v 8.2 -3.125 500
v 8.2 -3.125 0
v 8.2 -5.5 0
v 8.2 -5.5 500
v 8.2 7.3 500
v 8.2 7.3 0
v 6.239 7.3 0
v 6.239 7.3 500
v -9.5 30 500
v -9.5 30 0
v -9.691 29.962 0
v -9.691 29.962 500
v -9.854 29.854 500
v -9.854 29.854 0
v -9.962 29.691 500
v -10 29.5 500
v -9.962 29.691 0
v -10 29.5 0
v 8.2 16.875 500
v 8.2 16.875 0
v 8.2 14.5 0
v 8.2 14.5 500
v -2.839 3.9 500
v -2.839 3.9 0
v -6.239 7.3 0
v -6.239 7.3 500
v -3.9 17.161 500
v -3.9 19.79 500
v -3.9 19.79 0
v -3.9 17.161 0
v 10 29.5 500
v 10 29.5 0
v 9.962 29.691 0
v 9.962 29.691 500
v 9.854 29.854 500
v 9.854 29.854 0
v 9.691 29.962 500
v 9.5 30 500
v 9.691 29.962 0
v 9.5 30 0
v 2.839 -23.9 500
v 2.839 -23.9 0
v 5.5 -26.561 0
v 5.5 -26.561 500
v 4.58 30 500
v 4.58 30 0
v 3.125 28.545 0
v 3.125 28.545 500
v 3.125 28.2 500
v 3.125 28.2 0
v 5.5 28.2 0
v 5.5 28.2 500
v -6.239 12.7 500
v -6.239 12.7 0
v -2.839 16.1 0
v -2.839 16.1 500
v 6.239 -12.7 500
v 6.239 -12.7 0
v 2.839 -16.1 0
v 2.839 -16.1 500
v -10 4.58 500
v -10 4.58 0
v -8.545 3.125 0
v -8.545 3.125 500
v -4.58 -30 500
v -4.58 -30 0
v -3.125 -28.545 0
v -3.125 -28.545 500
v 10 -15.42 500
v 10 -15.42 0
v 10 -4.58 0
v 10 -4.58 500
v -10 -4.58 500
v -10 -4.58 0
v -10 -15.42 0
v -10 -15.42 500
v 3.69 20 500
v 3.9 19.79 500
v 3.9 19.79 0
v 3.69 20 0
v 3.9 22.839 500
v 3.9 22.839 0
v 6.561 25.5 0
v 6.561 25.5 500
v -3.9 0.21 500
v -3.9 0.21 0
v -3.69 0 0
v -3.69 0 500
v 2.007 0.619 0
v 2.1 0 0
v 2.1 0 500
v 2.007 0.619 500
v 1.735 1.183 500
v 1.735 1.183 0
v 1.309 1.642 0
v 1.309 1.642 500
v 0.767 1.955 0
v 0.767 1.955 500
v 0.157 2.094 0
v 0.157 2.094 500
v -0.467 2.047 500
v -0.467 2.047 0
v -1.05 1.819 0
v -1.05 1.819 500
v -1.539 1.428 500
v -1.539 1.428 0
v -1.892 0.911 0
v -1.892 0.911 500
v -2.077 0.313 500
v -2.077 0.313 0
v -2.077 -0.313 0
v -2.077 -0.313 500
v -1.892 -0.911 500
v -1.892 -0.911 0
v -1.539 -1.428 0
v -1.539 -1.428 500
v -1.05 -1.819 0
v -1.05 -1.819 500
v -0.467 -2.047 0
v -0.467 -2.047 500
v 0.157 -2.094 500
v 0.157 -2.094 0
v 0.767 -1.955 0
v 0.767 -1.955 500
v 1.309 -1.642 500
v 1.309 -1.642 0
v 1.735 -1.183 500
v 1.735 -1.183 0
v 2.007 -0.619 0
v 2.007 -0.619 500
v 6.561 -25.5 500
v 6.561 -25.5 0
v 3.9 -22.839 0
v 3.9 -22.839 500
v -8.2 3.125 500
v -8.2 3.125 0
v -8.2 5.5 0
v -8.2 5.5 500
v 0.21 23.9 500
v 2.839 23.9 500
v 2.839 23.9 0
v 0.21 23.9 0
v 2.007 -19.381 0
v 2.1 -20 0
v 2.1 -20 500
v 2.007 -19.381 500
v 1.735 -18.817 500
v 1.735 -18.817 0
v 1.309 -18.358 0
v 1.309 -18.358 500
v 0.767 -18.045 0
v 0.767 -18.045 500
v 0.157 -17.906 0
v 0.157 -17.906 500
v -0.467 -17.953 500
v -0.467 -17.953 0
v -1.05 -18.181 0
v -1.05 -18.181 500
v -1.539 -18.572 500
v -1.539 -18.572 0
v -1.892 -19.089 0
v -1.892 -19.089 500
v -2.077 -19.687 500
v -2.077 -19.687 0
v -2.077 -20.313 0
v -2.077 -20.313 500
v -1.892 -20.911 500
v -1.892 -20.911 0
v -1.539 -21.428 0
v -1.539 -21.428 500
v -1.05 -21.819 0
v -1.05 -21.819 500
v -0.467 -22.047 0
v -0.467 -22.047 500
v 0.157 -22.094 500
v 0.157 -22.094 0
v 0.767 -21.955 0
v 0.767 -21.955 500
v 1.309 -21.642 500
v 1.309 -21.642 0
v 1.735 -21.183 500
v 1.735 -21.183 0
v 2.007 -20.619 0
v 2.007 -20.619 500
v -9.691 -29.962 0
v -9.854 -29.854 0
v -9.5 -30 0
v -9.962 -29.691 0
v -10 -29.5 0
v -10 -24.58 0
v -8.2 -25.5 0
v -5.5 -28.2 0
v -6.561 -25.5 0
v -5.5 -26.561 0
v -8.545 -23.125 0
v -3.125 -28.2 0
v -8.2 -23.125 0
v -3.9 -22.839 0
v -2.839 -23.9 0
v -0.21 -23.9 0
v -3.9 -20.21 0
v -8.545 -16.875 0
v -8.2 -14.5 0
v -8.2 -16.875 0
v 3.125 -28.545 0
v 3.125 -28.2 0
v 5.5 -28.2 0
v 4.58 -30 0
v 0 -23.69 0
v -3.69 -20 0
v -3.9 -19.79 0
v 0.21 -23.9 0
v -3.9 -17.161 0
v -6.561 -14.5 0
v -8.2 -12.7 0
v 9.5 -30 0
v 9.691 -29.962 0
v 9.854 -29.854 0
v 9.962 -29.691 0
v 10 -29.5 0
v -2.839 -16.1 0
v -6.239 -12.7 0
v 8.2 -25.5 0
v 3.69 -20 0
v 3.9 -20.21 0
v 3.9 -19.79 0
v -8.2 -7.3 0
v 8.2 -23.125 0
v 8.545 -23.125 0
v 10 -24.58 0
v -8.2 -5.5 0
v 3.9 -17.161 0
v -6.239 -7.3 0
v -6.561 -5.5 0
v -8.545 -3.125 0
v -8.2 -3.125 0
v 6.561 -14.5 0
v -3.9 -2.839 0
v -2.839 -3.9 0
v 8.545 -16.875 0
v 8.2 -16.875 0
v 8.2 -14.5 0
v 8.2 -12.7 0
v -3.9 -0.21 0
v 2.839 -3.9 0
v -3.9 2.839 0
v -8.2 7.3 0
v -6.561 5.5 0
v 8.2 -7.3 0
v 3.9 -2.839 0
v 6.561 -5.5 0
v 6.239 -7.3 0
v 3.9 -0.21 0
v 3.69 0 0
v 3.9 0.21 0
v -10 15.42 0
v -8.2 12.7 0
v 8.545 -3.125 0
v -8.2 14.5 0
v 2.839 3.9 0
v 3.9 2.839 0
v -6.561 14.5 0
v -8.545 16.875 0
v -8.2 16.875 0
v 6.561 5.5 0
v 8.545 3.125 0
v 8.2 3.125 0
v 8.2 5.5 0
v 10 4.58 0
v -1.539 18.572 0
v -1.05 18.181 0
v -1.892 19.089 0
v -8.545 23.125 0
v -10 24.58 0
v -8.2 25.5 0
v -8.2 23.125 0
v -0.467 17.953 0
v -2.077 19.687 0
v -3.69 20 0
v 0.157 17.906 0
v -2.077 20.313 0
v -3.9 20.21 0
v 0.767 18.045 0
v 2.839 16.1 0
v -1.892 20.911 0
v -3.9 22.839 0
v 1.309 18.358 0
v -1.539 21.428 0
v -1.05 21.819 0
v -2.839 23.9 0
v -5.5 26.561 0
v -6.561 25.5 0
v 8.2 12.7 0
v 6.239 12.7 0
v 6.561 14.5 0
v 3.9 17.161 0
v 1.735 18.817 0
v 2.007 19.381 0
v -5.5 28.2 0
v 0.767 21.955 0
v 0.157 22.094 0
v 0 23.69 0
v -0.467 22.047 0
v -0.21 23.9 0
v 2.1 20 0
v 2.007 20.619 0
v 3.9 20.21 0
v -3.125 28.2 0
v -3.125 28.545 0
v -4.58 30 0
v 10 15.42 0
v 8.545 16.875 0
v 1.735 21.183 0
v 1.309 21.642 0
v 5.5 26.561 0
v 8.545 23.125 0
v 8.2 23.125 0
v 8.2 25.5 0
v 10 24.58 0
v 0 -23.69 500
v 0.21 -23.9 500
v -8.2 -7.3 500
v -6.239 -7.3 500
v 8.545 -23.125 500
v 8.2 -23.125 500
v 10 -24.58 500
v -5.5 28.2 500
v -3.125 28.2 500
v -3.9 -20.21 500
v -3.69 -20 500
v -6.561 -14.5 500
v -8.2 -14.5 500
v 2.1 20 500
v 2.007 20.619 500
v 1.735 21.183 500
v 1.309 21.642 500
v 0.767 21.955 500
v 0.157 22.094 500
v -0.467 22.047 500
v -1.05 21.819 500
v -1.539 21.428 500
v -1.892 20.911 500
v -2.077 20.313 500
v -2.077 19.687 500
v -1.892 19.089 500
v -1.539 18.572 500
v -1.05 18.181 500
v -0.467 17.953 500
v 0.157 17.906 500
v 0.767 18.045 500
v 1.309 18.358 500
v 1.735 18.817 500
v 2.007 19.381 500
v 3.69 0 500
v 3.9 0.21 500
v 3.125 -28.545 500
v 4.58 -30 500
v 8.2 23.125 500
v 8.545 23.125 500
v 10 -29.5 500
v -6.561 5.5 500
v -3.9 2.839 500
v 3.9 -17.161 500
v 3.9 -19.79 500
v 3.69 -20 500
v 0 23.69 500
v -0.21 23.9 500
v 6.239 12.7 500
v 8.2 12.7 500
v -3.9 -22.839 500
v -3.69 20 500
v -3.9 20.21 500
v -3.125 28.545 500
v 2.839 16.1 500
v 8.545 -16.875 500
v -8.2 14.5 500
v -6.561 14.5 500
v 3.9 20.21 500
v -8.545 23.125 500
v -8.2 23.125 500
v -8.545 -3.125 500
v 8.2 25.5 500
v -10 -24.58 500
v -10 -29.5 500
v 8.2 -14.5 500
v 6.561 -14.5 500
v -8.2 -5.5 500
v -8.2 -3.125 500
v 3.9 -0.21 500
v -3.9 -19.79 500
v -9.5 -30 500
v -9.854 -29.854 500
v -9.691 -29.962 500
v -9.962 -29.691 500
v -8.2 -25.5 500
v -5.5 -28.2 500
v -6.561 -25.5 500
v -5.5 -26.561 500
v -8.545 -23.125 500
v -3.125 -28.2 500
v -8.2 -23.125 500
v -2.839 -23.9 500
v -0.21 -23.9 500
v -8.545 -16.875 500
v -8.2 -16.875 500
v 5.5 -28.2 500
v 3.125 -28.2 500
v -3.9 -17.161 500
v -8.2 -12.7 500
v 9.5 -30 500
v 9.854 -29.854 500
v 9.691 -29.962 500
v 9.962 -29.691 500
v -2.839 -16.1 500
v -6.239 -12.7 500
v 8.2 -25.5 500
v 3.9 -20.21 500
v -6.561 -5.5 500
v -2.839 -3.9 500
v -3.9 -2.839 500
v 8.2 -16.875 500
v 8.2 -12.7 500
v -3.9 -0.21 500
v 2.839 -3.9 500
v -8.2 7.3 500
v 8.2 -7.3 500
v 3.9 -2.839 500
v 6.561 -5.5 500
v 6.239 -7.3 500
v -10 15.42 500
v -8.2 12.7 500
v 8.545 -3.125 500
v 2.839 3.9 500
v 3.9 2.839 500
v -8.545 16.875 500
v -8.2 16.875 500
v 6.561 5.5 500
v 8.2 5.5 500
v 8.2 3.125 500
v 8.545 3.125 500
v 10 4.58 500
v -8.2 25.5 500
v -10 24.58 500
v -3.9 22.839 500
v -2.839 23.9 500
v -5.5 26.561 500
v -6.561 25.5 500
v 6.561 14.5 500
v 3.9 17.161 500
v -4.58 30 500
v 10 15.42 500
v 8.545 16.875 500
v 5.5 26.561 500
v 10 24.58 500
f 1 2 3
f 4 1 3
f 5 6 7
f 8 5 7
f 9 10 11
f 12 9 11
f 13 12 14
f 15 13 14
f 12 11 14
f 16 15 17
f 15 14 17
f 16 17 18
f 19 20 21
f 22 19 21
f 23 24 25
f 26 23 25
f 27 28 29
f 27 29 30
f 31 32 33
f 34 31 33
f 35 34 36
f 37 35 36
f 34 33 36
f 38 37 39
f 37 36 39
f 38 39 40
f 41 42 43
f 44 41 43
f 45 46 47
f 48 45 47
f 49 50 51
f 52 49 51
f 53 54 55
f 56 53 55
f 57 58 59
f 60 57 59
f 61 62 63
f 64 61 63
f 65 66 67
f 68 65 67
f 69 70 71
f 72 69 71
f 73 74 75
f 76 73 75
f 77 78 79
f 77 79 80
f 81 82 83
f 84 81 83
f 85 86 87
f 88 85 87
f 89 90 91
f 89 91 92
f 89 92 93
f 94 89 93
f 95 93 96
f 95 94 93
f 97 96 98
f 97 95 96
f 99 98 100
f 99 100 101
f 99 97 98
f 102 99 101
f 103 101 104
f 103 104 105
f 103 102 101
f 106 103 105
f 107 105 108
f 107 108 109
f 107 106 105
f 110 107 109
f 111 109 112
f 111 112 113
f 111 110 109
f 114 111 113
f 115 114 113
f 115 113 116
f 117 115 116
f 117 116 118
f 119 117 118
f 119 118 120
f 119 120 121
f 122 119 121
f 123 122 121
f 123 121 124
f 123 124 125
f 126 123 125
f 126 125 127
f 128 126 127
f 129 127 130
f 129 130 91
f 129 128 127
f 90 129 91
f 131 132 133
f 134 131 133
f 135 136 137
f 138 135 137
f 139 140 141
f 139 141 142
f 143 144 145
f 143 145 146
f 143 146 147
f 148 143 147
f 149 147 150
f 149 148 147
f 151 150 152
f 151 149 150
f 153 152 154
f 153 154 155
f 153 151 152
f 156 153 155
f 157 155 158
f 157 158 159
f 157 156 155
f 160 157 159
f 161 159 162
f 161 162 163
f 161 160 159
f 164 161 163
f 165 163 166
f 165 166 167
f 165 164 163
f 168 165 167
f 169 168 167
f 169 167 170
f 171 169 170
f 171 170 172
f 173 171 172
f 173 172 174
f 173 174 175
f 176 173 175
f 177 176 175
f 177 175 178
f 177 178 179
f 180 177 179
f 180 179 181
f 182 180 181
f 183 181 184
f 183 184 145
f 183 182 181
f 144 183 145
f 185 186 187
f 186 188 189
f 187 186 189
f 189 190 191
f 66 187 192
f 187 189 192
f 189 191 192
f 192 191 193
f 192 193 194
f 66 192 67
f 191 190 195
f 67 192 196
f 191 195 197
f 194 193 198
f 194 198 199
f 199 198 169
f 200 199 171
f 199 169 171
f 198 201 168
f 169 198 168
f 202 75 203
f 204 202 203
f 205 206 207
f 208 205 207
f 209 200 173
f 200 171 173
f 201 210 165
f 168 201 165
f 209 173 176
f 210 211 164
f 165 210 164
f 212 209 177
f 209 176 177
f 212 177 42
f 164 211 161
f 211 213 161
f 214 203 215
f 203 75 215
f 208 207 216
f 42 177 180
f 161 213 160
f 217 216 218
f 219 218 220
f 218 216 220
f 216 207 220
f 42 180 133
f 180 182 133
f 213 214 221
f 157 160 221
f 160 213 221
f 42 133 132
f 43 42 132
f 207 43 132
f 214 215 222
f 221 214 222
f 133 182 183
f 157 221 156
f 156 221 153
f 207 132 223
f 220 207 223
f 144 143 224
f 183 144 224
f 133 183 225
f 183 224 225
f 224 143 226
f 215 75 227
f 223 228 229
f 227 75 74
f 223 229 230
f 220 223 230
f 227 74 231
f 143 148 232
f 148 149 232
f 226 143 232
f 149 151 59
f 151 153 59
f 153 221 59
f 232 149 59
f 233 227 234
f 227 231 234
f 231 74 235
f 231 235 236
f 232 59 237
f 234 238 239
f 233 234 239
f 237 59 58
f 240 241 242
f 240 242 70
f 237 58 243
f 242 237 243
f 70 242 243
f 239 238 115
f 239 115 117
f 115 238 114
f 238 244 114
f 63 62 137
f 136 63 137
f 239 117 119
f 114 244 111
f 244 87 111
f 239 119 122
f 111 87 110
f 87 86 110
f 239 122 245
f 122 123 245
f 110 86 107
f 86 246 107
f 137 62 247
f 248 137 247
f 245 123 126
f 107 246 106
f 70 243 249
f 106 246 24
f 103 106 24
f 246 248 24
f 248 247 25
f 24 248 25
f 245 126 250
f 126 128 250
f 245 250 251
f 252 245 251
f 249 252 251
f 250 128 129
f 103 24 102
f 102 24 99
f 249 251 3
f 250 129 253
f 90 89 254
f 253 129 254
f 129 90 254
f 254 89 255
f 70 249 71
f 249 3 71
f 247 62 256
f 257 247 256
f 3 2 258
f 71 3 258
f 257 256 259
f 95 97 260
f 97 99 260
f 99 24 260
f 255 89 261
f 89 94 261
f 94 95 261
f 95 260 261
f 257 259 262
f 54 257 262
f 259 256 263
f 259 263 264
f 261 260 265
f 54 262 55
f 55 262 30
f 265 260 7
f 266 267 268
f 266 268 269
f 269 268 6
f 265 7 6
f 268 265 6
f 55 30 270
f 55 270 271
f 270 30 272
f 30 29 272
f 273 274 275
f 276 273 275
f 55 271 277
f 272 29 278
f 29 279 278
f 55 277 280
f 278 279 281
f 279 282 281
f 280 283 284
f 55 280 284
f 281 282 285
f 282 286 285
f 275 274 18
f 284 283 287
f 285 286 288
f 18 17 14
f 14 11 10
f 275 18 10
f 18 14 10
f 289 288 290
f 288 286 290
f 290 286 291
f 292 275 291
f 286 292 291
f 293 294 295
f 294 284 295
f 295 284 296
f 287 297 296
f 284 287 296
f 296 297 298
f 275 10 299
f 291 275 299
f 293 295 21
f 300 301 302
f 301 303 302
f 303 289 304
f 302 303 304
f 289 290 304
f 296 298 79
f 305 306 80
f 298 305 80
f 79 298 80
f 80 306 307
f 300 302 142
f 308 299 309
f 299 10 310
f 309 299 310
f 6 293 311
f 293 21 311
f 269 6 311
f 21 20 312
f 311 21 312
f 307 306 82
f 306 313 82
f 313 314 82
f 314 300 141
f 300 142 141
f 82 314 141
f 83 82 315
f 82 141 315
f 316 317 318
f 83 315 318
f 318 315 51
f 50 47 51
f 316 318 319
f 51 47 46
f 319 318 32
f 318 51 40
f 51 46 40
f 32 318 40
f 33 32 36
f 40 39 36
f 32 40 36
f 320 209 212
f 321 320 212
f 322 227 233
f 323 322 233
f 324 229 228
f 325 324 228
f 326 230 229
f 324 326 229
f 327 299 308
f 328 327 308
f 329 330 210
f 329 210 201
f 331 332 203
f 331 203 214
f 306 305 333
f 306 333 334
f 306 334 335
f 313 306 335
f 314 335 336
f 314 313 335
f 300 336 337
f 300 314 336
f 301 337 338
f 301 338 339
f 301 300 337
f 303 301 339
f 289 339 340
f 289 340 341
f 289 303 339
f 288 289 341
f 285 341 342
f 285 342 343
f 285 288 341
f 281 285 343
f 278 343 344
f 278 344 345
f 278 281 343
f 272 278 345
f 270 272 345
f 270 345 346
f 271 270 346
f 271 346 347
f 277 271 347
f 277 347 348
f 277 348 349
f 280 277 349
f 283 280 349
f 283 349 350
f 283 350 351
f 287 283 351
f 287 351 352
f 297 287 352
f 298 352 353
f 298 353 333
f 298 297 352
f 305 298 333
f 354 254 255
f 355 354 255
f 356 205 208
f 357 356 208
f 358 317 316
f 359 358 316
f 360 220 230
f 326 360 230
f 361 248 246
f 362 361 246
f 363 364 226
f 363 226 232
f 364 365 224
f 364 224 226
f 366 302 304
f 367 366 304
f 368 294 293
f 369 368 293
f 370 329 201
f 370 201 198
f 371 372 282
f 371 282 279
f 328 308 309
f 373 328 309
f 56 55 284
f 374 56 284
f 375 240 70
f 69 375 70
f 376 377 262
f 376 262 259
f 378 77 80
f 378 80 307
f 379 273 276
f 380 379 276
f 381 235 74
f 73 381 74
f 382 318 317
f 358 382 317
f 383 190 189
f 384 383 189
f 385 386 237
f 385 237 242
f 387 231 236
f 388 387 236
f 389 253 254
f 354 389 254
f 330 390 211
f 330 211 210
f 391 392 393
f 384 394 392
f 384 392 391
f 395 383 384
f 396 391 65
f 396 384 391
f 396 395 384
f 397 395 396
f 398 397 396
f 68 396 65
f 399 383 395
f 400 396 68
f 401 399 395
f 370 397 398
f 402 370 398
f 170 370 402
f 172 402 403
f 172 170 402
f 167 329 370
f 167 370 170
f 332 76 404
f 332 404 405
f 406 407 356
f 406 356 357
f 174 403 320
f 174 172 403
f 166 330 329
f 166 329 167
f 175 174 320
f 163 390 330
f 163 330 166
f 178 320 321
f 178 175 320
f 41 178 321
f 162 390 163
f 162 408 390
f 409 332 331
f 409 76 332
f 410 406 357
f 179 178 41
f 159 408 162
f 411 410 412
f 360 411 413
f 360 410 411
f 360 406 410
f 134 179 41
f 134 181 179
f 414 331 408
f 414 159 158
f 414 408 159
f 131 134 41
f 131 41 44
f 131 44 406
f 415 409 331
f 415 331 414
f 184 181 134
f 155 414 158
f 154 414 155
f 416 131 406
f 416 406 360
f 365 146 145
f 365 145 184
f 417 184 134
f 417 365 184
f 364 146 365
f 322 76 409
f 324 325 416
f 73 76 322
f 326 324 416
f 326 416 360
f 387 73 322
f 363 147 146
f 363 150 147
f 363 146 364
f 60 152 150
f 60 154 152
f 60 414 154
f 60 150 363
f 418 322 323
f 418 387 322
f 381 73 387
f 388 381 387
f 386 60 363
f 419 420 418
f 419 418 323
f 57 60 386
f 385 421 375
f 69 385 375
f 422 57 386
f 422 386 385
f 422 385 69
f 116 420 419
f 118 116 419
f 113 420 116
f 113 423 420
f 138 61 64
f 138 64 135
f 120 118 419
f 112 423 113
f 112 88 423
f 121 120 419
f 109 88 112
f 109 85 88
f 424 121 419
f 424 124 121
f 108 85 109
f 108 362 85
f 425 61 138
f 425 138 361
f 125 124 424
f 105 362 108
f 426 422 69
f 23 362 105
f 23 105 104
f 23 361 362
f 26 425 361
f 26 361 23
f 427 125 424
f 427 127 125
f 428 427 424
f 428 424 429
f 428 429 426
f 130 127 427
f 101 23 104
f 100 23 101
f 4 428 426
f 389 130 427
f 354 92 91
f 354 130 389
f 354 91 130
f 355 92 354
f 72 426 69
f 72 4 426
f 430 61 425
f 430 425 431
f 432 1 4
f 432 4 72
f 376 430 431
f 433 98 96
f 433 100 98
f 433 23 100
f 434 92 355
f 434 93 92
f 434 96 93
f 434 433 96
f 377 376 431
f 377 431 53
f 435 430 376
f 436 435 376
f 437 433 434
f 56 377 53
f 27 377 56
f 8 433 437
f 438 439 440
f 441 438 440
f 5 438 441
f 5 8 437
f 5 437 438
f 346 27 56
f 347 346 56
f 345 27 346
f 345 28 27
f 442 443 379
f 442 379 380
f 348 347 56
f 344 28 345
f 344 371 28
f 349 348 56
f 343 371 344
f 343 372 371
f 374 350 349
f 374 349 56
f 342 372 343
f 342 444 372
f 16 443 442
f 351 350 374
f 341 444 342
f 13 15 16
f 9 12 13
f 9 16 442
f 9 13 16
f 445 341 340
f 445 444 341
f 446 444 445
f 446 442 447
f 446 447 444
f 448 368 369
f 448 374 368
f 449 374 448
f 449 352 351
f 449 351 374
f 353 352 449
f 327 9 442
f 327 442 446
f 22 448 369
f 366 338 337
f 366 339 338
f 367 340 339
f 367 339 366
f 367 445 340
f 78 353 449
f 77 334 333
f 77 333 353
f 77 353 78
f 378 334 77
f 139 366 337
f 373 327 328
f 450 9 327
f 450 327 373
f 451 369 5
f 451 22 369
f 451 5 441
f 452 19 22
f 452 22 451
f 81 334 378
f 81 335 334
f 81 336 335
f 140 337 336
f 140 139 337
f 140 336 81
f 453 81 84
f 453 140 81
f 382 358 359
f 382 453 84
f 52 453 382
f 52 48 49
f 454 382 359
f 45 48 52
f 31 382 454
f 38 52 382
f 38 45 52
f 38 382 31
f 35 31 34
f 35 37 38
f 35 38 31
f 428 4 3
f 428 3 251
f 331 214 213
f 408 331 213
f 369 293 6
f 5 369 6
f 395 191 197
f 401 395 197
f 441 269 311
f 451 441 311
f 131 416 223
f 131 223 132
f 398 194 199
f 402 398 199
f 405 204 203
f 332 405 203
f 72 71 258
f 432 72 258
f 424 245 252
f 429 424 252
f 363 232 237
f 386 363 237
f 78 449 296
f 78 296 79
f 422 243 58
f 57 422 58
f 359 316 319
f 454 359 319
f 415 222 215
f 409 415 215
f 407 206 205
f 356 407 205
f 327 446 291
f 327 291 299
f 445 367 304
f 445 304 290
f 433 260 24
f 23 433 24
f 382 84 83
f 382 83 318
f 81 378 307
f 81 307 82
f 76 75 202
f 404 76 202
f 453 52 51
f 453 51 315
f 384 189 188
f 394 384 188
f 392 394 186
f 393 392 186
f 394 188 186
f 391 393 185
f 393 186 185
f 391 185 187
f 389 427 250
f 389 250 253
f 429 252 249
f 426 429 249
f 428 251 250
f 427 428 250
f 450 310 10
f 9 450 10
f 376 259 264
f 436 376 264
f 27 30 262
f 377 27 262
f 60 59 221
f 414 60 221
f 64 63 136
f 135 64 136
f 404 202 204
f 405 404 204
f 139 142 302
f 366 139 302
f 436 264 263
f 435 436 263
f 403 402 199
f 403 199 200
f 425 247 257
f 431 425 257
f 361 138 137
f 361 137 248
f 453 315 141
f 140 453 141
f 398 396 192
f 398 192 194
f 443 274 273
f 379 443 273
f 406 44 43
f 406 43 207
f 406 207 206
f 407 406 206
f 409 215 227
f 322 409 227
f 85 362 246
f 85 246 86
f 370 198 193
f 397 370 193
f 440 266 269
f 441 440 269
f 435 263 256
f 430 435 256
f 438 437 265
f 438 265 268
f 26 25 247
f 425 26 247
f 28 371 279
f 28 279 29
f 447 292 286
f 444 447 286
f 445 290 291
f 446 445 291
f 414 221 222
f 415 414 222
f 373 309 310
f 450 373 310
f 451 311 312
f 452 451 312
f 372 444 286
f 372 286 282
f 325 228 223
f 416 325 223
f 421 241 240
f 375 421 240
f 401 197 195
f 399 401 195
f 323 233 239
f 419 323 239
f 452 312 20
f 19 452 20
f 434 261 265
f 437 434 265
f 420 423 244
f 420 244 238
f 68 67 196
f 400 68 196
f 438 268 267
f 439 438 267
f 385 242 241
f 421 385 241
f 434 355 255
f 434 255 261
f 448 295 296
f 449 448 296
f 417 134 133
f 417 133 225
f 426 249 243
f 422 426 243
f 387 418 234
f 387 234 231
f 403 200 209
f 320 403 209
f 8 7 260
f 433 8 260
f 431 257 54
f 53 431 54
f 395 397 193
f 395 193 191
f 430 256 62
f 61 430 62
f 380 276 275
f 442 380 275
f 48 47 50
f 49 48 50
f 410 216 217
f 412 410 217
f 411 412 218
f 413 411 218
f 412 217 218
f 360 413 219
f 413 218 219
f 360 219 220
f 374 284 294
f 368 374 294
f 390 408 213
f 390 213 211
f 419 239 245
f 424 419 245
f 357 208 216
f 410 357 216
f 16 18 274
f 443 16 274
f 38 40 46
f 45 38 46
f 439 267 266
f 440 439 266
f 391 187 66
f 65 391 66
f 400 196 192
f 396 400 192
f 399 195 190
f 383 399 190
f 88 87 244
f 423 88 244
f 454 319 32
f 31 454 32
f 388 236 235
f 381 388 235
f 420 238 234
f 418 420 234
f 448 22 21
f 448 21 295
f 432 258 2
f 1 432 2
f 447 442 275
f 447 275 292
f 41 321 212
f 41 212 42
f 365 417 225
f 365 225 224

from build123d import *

# Parameters (mm, degrees)
SKETCH1_R           = 2.1
BOSS_EXTRUDE1_DEPTH = 500


with BuildPart() as part:
    # Sketch1 → Boss-Extrude1 (new body)
    with BuildSketch(Plane.XY):
        with BuildLine():
            Line((4.58, -30), (9.5, -30))
            ThreePointArc((9.5, -30), (9.853553391, -29.853553391), (10, -29.5))
            Line((10, -29.5), (10, -24.58))
            Line((10, -24.58), (8.545, -23.125))
            Line((8.545, -23.125), (8.2, -23.125))
            Line((8.2, -23.125), (8.2, -25.5))
            Line((8.2, -25.5), (6.560660172, -25.5))
            Line((6.560660172, -25.5), (3.9, -22.839339828))
            Line((3.9, -22.839339828), (3.9, -20.21))
            Line((3.9, -20.21), (3.69, -20))
            Line((3.69, -20), (3.9, -19.79))
            Line((3.9, -19.79), (3.9, -17.160660172))
            Line((3.9, -17.160660172), (6.560660172, -14.5))
            Line((6.560660172, -14.5), (8.2, -14.5))
            Line((8.2, -14.5), (8.2, -16.875))
            Line((8.2, -16.875), (8.545, -16.875))
            Line((8.545, -16.875), (10, -15.42))
            Line((10, -15.42), (10, -4.58))
            Line((10, -4.58), (8.545, -3.125))
            Line((8.545, -3.125), (8.2, -3.125))
            Line((8.2, -3.125), (8.2, -5.5))
            Line((8.2, -5.5), (6.560660172, -5.5))
            Line((6.560660172, -5.5), (3.9, -2.839339828))
            Line((3.9, -2.839339828), (3.9, -0.21))
            Line((3.9, -0.21), (3.69, 0))
            Line((3.69, 0), (3.9, 0.21))
            Line((3.9, 0.21), (3.9, 2.839339828))
            Line((3.9, 2.839339828), (6.560660172, 5.5))
            Line((6.560660172, 5.5), (8.2, 5.5))
            Line((8.2, 5.5), (8.2, 3.125))
            Line((8.2, 3.125), (8.545, 3.125))
            Line((8.545, 3.125), (10, 4.58))
            Line((10, 4.58), (10, 15.42))
            Line((10, 15.42), (8.545, 16.875))
            Line((8.545, 16.875), (8.2, 16.875))
            Line((8.2, 16.875), (8.2, 14.5))
            Line((8.2, 14.5), (6.560660172, 14.5))
            Line((6.560660172, 14.5), (3.9, 17.160660172))
            Line((3.9, 17.160660172), (3.9, 19.79))
            Line((3.9, 19.79), (3.69, 20))
            Line((3.69, 20), (3.9, 20.21))
            Line((3.9, 20.21), (3.9, 22.839339828))
            Line((3.9, 22.839339828), (6.560660172, 25.5))
            Line((6.560660172, 25.5), (8.2, 25.5))
            Line((8.2, 25.5), (8.2, 23.125))
            Line((8.2, 23.125), (8.545, 23.125))
            Line((8.545, 23.125), (10, 24.58))
            Line((10, 24.58), (10, 29.5))
            ThreePointArc((10, 29.5), (9.853553391, 29.853553391), (9.5, 30))
            Line((9.5, 30), (4.58, 30))
            Line((4.58, 30), (3.125, 28.545))
            Line((3.125, 28.545), (3.125, 28.2))
            Line((3.125, 28.2), (5.5, 28.2))
            Line((5.5, 28.2), (5.5, 26.560660172))
            Line((5.5, 26.560660172), (2.839339828, 23.9))
            Line((2.839339828, 23.9), (0.21, 23.9))
            Line((0.21, 23.9), (0, 23.69))
            Line((0, 23.69), (-0.21, 23.9))
            Line((-0.21, 23.9), (-2.839339828, 23.9))
            Line((-2.839339828, 23.9), (-5.5, 26.560660172))
            Line((-5.5, 26.560660172), (-5.5, 28.2))
            Line((-5.5, 28.2), (-3.125, 28.2))
            Line((-3.125, 28.2), (-3.125, 28.545))
            Line((-3.125, 28.545), (-4.58, 30))
            Line((-4.58, 30), (-9.5, 30))
            ThreePointArc((-9.5, 30), (-9.853553391, 29.853553391), (-10, 29.5))
            Line((-10, 29.5), (-10, 24.58))
            Line((-10, 24.58), (-8.545, 23.125))
            Line((-8.545, 23.125), (-8.2, 23.125))
            Line((-8.2, 23.125), (-8.2, 25.5))
            Line((-8.2, 25.5), (-6.560660172, 25.5))
            Line((-6.560660172, 25.5), (-3.9, 22.839339828))
            Line((-3.9, 22.839339828), (-3.9, 20.21))
            Line((-3.9, 20.21), (-3.69, 20))
            Line((-3.69, 20), (-3.9, 19.79))
            Line((-3.9, 19.79), (-3.9, 17.160660172))
            Line((-3.9, 17.160660172), (-6.560660172, 14.5))
            Line((-6.560660172, 14.5), (-8.2, 14.5))
            Line((-8.2, 14.5), (-8.2, 16.875))
            Line((-8.2, 16.875), (-8.545, 16.875))
            Line((-8.545, 16.875), (-10, 15.42))
            Line((-10, 15.42), (-10, 4.58))
            Line((-10, 4.58), (-8.545, 3.125))
            Line((-8.545, 3.125), (-8.2, 3.125))
            Line((-8.2, 3.125), (-8.2, 5.5))
            Line((-8.2, 5.5), (-6.560660172, 5.5))
            Line((-6.560660172, 5.5), (-3.9, 2.839339828))
            Line((-3.9, 2.839339828), (-3.9, 0.21))
            Line((-3.9, 0.21), (-3.69, 0))
            Line((-3.69, 0), (-3.9, -0.21))
            Line((-3.9, -0.21), (-3.9, -2.839339828))
            Line((-3.9, -2.839339828), (-6.560660172, -5.5))
            Line((-6.560660172, -5.5), (-8.2, -5.5))
            Line((-8.2, -5.5), (-8.2, -3.125))
            Line((-8.2, -3.125), (-8.545, -3.125))
            Line((-8.545, -3.125), (-10, -4.58))
            Line((-10, -4.58), (-10, -15.42))
            Line((-10, -15.42), (-8.545, -16.875))
            Line((-8.545, -16.875), (-8.2, -16.875))
            Line((-8.2, -16.875), (-8.2, -14.5))
            Line((-8.2, -14.5), (-6.560660172, -14.5))
            Line((-6.560660172, -14.5), (-3.9, -17.160660172))
            Line((-3.9, -17.160660172), (-3.9, -19.79))
            Line((-3.9, -19.79), (-3.69, -20))
            Line((-3.69, -20), (-3.9, -20.21))
            Line((-3.9, -20.21), (-3.9, -22.839339828))
            Line((-3.9, -22.839339828), (-6.560660172, -25.5))
            Line((-6.560660172, -25.5), (-8.2, -25.5))
            Line((-8.2, -25.5), (-8.2, -23.125))
            Line((-8.2, -23.125), (-8.545, -23.125))
            Line((-8.545, -23.125), (-10, -24.58))
            Line((-10, -24.58), (-10, -29.5))
            ThreePointArc((-10, -29.5), (-9.853553391, -29.853553391), (-9.5, -30))
            Line((-9.5, -30), (-4.58, -30))
            Line((-4.58, -30), (-3.125, -28.545))
            Line((-3.125, -28.545), (-3.125, -28.2))
            Line((-3.125, -28.2), (-5.5, -28.2))
            Line((-5.5, -28.2), (-5.5, -26.560660172))
            Line((-5.5, -26.560660172), (-2.839339828, -23.9))
            Line((-2.839339828, -23.9), (-0.21, -23.9))
            Line((-0.21, -23.9), (0, -23.69))
            Line((0, -23.69), (0.21, -23.9))
            Line((0.21, -23.9), (2.839339828, -23.9))
            Line((2.839339828, -23.9), (5.5, -26.560660172))
            Line((5.5, -26.560660172), (5.5, -28.2))
            Line((5.5, -28.2), (3.125, -28.2))
            Line((3.125, -28.2), (3.125, -28.545))
            Line((3.125, -28.545), (4.58, -30))
        make_face()
        with Locations((0, -20)):
            Circle(SKETCH1_R, mode=Mode.SUBTRACT)
        Polygon((-6.239339828, -12.7), (-8.2, -12.7), (-8.2, -7.3), (-6.239339828, -7.3), (-2.839339828, -3.9), (2.839339828, -3.9), (6.239339828, -7.3), (8.2, -7.3), (8.2, -12.7), (6.239339828, -12.7), (2.839339828, -16.1), (-2.839339828, -16.1), align=None, mode=Mode.SUBTRACT)
        Polygon((-6.239339828, 7.3), (-8.2, 7.3), (-8.2, 12.7), (-6.239339828, 12.7), (-2.839339828, 16.1), (2.839339828, 16.1), (6.239339828, 12.7), (8.2, 12.7), (8.2, 7.3), (6.239339828, 7.3), (2.839339828, 3.9), (-2.839339828, 3.9), align=None, mode=Mode.SUBTRACT)
        with Locations((0, 20)):
            Circle(SKETCH1_R, mode=Mode.SUBTRACT)
        Circle(SKETCH1_R, mode=Mode.SUBTRACT)
    extrude(amount=BOSS_EXTRUDE1_DEPTH)


solid = part.part
